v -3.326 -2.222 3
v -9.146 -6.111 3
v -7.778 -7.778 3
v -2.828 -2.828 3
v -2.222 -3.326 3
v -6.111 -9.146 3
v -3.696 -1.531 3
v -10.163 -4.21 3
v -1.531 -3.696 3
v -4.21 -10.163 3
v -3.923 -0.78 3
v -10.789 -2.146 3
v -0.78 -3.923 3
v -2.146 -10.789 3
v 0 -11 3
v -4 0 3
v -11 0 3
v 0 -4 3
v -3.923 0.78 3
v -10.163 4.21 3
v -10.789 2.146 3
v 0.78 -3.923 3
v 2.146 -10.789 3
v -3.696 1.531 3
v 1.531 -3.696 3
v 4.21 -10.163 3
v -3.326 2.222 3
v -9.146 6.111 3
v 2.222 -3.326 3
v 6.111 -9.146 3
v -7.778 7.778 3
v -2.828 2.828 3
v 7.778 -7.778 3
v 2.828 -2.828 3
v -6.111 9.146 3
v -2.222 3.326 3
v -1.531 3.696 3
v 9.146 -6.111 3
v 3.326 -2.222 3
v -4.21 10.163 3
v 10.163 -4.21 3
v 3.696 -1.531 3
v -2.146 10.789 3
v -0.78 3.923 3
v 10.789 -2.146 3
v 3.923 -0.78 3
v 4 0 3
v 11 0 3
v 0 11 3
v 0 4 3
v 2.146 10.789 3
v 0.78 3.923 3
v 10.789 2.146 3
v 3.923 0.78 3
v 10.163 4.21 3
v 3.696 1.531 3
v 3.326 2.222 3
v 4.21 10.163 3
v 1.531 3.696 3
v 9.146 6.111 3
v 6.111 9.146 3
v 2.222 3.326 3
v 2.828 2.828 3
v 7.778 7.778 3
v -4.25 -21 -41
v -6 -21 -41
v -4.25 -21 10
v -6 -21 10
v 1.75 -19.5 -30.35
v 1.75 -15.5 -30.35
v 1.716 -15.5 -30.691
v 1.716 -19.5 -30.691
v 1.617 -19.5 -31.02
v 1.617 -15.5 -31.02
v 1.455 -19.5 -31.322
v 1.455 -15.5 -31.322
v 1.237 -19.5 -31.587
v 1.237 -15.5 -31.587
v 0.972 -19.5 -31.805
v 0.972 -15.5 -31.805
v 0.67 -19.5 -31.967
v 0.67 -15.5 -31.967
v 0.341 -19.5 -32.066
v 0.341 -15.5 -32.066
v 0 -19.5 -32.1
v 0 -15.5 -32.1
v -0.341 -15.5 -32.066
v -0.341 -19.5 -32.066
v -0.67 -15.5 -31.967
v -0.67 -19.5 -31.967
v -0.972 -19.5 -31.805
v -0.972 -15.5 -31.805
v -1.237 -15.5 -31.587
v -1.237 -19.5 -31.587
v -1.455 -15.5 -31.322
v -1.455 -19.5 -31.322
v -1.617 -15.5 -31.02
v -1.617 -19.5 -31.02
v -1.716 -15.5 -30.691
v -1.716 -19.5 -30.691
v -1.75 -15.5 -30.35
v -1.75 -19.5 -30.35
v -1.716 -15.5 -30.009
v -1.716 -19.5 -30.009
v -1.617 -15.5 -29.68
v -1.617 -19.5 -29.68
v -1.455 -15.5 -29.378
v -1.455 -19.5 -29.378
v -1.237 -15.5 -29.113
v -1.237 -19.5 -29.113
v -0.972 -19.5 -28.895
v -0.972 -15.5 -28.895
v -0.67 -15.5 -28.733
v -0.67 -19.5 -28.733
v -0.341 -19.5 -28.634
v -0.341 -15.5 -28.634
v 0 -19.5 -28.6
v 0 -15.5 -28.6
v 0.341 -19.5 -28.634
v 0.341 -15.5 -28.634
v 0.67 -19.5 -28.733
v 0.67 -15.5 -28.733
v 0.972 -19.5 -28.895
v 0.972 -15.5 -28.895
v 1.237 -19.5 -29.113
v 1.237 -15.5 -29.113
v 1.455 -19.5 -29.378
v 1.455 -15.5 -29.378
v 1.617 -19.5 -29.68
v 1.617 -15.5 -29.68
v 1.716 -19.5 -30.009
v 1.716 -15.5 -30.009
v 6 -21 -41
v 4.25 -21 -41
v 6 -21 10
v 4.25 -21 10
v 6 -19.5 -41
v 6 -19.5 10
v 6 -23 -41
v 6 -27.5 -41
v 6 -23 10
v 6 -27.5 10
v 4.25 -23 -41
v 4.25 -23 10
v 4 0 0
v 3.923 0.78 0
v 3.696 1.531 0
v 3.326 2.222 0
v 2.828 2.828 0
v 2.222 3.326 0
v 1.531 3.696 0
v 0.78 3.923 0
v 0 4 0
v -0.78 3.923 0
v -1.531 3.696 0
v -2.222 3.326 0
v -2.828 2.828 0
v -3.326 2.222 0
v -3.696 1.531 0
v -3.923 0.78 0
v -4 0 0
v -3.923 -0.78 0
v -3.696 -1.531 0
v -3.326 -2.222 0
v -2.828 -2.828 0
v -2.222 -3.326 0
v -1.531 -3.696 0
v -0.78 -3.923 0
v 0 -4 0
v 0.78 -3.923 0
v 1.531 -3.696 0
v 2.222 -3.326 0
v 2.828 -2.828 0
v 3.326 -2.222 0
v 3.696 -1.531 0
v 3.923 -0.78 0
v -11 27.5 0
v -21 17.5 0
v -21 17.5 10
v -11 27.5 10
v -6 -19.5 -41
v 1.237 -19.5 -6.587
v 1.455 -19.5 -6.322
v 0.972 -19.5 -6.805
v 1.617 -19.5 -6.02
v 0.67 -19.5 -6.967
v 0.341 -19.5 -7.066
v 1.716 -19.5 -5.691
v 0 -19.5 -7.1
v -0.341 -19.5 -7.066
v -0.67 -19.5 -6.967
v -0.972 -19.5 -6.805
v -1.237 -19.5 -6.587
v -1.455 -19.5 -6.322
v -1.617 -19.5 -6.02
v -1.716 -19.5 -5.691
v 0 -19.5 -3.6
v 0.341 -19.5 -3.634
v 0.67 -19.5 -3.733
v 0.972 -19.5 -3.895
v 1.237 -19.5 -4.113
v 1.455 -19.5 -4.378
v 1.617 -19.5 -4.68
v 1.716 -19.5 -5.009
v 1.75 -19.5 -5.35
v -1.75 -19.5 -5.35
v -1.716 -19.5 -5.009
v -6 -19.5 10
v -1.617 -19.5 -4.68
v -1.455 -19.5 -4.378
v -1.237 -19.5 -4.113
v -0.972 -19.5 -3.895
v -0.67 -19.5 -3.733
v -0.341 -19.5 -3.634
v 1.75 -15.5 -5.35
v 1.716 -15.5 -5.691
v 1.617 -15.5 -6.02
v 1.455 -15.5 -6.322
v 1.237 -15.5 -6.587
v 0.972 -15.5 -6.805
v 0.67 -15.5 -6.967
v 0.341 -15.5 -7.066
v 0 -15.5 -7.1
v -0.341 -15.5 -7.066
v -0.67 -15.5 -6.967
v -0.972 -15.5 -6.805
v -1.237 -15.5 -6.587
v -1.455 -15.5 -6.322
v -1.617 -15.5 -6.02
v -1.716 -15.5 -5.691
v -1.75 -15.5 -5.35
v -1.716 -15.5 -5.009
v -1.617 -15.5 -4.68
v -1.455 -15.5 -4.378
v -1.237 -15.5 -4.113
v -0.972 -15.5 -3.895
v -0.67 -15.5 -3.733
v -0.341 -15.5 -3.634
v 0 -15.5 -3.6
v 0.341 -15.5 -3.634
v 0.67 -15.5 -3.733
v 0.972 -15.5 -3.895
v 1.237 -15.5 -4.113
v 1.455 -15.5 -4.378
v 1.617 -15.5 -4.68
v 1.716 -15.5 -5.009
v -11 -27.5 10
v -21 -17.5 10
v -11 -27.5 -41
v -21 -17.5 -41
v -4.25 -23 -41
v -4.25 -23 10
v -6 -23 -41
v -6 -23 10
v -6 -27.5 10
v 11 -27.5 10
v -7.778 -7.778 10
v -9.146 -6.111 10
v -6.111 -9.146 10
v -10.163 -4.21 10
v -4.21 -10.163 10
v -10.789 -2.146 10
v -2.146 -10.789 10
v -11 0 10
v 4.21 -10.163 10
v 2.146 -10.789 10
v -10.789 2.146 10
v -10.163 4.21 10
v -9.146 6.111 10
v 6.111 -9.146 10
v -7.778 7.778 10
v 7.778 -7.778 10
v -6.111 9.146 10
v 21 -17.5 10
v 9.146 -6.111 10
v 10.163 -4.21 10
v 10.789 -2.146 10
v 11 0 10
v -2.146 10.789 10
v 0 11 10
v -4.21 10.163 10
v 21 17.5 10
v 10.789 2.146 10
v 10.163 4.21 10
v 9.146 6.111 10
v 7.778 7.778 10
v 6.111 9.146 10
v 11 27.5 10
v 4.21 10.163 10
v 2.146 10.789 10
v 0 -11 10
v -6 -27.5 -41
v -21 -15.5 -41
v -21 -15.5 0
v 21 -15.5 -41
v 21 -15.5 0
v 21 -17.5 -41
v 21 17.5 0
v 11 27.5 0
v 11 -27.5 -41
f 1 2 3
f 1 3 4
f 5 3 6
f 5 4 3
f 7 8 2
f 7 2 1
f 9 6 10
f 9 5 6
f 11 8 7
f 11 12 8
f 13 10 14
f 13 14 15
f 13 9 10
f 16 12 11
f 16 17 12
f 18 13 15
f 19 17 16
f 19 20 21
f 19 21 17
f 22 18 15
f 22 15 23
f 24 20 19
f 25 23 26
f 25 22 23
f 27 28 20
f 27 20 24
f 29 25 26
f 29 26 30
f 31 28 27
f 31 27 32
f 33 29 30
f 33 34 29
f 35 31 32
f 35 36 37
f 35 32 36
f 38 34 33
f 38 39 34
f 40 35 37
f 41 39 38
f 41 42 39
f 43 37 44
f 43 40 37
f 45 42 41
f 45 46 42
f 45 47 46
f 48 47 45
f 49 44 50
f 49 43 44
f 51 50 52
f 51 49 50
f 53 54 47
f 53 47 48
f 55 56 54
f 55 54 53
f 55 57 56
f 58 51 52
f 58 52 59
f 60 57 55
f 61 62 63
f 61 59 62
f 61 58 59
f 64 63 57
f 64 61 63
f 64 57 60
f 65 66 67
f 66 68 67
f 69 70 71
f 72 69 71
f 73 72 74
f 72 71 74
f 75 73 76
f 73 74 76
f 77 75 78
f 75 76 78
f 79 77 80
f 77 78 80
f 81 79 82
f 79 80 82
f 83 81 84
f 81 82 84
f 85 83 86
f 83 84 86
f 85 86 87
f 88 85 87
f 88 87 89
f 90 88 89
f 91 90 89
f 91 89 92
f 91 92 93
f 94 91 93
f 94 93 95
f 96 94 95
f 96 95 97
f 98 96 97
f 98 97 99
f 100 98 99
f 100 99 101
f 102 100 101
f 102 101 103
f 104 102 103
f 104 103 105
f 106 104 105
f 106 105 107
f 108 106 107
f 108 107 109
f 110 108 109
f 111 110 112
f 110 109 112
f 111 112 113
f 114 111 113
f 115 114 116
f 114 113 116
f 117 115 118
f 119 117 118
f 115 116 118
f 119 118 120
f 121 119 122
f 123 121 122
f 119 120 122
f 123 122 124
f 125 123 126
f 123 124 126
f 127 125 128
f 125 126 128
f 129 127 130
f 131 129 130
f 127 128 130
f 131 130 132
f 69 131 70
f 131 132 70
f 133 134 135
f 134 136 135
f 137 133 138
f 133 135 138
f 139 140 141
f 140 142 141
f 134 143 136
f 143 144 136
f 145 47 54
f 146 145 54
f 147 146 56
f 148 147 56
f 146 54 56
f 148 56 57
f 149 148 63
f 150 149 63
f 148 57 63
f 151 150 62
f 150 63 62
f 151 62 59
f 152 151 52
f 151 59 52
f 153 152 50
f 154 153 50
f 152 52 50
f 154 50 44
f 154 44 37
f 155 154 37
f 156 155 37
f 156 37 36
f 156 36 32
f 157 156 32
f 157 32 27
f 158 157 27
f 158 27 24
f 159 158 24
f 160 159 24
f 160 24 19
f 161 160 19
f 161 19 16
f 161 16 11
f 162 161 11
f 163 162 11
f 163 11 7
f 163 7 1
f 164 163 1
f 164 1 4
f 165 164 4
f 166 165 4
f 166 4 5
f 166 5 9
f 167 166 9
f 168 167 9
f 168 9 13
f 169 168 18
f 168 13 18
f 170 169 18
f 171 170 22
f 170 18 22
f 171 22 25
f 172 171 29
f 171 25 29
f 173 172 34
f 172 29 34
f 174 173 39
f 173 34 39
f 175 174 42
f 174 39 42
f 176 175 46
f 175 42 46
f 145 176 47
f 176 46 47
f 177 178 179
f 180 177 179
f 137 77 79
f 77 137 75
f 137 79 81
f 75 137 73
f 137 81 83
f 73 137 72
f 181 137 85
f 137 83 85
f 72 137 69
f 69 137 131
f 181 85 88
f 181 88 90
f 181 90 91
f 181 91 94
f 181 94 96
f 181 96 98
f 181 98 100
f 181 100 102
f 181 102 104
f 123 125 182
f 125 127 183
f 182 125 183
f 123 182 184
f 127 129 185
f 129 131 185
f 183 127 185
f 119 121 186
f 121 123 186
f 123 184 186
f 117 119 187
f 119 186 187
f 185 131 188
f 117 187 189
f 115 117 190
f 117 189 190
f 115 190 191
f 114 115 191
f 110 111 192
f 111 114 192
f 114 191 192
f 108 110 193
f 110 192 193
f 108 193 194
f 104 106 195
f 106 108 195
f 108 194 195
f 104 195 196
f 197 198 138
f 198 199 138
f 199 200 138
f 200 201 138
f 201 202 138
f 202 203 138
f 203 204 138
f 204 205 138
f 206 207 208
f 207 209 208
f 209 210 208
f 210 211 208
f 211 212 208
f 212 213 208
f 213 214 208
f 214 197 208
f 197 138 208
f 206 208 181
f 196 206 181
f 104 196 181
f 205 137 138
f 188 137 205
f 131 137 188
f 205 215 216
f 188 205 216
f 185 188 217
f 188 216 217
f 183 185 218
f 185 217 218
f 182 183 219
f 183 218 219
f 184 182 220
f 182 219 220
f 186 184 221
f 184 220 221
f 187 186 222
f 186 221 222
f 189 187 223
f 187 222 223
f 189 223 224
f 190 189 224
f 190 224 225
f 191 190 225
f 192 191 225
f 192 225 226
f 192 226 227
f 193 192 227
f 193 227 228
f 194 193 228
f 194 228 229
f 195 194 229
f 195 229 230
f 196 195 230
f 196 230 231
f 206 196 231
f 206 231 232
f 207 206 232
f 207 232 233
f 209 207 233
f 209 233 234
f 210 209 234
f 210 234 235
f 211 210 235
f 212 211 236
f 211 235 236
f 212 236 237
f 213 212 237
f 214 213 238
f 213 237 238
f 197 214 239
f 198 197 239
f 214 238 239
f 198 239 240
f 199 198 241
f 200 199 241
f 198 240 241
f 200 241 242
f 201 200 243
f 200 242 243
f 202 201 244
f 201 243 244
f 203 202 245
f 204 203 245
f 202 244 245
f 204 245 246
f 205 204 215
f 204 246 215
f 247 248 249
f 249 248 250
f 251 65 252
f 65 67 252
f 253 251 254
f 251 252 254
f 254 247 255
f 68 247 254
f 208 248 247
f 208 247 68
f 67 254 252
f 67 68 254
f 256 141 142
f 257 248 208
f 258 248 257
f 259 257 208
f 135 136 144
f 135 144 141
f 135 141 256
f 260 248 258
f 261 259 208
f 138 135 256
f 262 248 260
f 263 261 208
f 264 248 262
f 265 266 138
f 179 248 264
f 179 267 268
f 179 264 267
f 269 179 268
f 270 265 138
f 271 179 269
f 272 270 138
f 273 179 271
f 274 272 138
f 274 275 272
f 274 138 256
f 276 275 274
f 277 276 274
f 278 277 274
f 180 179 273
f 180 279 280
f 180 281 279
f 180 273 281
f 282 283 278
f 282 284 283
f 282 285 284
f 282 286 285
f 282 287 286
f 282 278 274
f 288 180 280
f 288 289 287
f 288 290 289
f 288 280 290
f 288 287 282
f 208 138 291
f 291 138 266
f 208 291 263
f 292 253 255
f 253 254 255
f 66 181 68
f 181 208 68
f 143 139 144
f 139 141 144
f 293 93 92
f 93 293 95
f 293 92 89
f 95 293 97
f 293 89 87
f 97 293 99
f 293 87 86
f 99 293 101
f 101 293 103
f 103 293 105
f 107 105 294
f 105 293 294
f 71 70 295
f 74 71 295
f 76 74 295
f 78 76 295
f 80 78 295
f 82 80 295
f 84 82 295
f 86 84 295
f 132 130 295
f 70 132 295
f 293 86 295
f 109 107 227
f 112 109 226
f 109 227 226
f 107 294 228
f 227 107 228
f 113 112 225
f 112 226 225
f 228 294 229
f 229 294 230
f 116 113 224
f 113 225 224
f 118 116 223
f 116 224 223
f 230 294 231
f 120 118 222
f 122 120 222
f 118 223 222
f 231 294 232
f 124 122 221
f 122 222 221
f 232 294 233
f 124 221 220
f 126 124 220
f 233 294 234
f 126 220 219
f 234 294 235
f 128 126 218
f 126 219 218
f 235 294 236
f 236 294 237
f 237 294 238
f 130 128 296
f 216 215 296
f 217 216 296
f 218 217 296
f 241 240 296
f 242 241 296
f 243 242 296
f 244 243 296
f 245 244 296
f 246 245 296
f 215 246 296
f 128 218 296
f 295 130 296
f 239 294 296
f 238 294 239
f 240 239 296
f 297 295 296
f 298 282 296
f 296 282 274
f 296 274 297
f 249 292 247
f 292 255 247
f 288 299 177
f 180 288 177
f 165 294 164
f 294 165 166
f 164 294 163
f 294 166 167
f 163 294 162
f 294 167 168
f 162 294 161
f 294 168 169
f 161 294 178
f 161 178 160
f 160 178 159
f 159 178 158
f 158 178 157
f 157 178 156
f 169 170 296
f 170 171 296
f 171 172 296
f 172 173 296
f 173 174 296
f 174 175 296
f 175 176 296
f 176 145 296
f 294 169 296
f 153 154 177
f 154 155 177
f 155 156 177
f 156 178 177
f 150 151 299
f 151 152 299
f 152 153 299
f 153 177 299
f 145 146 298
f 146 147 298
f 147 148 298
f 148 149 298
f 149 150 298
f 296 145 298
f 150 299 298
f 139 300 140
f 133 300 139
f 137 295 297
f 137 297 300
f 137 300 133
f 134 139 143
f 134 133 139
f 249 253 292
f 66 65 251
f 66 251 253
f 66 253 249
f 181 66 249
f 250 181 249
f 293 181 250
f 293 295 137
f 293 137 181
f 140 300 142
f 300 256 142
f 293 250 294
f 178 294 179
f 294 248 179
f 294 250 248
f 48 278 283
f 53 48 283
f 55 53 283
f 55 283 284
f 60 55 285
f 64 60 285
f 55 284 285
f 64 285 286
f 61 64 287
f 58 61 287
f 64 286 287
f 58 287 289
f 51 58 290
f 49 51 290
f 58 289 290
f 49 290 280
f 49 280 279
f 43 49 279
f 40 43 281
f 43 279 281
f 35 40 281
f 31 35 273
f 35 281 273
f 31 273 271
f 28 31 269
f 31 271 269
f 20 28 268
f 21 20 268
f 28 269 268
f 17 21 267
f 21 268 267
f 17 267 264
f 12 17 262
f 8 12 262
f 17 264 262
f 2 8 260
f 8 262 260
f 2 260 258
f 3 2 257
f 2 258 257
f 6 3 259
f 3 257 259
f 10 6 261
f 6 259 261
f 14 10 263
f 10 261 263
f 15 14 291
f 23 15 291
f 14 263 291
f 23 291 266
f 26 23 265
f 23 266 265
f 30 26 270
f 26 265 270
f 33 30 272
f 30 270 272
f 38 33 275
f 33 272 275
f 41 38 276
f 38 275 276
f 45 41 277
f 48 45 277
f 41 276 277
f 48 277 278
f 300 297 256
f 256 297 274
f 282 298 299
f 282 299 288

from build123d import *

# Parameters (mm, degrees)
ESTRUSIONE_ESTRUSIONE1_DEPTH = 10
SCHIZZO2_R                   = 11
TAGLIO_ESTRUSIONE1_DEPTH     = 7
SCHIZZO3_R                   = 4
TAGLIO_ESTRUSIONE2_DEPTH     = 4
ESTRUSIONE_ESTRUSIONE2_DEPTH = 41
SMUSSO1_SIZE                 = 10
SCHIZZO5_R                   = 1.75
TAGLIO_ESTRUSIONE3_DEPTH     = 13


with BuildPart() as part:
    # Schizzo1 → Estrusione-Estrusione1 (new body)
    with BuildSketch(Plane.XY):
        Polygon((6, -23), (6, -27.5), (21, -27.5), (21, 27.5), (-21, 27.5), (-21, -27.5), (-6, -27.5), (-6, -23), (-4.25, -23), (-4.25, -21), (-6, -21), (-6, -19.5), (6, -19.5), (6, -21), (4.25, -21), (4.25, -23), align=None)
    extrude(amount=ESTRUSIONE_ESTRUSIONE1_DEPTH)

    # Schizzo2 → Taglio-Estrusione1 (cut)
    with BuildSketch(Plane.XY.offset(10)):
        Circle(SCHIZZO2_R)
    extrude(amount=-TAGLIO_ESTRUSIONE1_DEPTH, mode=Mode.SUBTRACT)

    # Schizzo3 → Taglio-Estrusione2 (cut, through all)
    with BuildSketch(Plane.XY.offset(3)):
        Circle(SCHIZZO3_R)
    extrude(amount=-TAGLIO_ESTRUSIONE2_DEPTH, mode=Mode.SUBTRACT)

    # Schizzo4 → Estrusione-Estrusione2 (add)
    with BuildSketch(Plane(origin=(0, 0, 0), x_dir=(-1, 0, 0), z_dir=(0, 0, -1))):
        Polygon((-21, -27.5), (-6, -27.5), (-6, -23), (-4.25, -23), (-4.25, -21), (-6, -21), (-6, -19.5), (6, -19.5), (6, -21), (4.25, -21), (4.25, -23), (6, -23), (6, -27.5), (21, -27.5), (21, -15.5), (-21, -15.5), align=None)
    extrude(amount=ESTRUSIONE_ESTRUSIONE2_DEPTH)

    # Smusso1
    smusso1_edges = [part.edges().sort_by_distance(p)[0] for p in [
        (21, -27.5, -15.5),
        (-21, -27.5, -15.5),
        (-21, 27.5, 5),
        (21, 27.5, 5),
    ]]
    chamfer(smusso1_edges, length=SMUSSO1_SIZE)

    # Schizzo5 → Taglio-Estrusione3 (cut, through all)
    with BuildSketch(Plane(origin=(0, -15.5, 0), x_dir=(1, 0, 0), z_dir=(0, 1, 0))):
        with Locations((0, 30.35)):
            Circle(SCHIZZO5_R)
        with Locations((0, 5.35)):
            Circle(SCHIZZO5_R)
    extrude(amount=-TAGLIO_ESTRUSIONE3_DEPTH, mode=Mode.SUBTRACT)


solid = part.part
